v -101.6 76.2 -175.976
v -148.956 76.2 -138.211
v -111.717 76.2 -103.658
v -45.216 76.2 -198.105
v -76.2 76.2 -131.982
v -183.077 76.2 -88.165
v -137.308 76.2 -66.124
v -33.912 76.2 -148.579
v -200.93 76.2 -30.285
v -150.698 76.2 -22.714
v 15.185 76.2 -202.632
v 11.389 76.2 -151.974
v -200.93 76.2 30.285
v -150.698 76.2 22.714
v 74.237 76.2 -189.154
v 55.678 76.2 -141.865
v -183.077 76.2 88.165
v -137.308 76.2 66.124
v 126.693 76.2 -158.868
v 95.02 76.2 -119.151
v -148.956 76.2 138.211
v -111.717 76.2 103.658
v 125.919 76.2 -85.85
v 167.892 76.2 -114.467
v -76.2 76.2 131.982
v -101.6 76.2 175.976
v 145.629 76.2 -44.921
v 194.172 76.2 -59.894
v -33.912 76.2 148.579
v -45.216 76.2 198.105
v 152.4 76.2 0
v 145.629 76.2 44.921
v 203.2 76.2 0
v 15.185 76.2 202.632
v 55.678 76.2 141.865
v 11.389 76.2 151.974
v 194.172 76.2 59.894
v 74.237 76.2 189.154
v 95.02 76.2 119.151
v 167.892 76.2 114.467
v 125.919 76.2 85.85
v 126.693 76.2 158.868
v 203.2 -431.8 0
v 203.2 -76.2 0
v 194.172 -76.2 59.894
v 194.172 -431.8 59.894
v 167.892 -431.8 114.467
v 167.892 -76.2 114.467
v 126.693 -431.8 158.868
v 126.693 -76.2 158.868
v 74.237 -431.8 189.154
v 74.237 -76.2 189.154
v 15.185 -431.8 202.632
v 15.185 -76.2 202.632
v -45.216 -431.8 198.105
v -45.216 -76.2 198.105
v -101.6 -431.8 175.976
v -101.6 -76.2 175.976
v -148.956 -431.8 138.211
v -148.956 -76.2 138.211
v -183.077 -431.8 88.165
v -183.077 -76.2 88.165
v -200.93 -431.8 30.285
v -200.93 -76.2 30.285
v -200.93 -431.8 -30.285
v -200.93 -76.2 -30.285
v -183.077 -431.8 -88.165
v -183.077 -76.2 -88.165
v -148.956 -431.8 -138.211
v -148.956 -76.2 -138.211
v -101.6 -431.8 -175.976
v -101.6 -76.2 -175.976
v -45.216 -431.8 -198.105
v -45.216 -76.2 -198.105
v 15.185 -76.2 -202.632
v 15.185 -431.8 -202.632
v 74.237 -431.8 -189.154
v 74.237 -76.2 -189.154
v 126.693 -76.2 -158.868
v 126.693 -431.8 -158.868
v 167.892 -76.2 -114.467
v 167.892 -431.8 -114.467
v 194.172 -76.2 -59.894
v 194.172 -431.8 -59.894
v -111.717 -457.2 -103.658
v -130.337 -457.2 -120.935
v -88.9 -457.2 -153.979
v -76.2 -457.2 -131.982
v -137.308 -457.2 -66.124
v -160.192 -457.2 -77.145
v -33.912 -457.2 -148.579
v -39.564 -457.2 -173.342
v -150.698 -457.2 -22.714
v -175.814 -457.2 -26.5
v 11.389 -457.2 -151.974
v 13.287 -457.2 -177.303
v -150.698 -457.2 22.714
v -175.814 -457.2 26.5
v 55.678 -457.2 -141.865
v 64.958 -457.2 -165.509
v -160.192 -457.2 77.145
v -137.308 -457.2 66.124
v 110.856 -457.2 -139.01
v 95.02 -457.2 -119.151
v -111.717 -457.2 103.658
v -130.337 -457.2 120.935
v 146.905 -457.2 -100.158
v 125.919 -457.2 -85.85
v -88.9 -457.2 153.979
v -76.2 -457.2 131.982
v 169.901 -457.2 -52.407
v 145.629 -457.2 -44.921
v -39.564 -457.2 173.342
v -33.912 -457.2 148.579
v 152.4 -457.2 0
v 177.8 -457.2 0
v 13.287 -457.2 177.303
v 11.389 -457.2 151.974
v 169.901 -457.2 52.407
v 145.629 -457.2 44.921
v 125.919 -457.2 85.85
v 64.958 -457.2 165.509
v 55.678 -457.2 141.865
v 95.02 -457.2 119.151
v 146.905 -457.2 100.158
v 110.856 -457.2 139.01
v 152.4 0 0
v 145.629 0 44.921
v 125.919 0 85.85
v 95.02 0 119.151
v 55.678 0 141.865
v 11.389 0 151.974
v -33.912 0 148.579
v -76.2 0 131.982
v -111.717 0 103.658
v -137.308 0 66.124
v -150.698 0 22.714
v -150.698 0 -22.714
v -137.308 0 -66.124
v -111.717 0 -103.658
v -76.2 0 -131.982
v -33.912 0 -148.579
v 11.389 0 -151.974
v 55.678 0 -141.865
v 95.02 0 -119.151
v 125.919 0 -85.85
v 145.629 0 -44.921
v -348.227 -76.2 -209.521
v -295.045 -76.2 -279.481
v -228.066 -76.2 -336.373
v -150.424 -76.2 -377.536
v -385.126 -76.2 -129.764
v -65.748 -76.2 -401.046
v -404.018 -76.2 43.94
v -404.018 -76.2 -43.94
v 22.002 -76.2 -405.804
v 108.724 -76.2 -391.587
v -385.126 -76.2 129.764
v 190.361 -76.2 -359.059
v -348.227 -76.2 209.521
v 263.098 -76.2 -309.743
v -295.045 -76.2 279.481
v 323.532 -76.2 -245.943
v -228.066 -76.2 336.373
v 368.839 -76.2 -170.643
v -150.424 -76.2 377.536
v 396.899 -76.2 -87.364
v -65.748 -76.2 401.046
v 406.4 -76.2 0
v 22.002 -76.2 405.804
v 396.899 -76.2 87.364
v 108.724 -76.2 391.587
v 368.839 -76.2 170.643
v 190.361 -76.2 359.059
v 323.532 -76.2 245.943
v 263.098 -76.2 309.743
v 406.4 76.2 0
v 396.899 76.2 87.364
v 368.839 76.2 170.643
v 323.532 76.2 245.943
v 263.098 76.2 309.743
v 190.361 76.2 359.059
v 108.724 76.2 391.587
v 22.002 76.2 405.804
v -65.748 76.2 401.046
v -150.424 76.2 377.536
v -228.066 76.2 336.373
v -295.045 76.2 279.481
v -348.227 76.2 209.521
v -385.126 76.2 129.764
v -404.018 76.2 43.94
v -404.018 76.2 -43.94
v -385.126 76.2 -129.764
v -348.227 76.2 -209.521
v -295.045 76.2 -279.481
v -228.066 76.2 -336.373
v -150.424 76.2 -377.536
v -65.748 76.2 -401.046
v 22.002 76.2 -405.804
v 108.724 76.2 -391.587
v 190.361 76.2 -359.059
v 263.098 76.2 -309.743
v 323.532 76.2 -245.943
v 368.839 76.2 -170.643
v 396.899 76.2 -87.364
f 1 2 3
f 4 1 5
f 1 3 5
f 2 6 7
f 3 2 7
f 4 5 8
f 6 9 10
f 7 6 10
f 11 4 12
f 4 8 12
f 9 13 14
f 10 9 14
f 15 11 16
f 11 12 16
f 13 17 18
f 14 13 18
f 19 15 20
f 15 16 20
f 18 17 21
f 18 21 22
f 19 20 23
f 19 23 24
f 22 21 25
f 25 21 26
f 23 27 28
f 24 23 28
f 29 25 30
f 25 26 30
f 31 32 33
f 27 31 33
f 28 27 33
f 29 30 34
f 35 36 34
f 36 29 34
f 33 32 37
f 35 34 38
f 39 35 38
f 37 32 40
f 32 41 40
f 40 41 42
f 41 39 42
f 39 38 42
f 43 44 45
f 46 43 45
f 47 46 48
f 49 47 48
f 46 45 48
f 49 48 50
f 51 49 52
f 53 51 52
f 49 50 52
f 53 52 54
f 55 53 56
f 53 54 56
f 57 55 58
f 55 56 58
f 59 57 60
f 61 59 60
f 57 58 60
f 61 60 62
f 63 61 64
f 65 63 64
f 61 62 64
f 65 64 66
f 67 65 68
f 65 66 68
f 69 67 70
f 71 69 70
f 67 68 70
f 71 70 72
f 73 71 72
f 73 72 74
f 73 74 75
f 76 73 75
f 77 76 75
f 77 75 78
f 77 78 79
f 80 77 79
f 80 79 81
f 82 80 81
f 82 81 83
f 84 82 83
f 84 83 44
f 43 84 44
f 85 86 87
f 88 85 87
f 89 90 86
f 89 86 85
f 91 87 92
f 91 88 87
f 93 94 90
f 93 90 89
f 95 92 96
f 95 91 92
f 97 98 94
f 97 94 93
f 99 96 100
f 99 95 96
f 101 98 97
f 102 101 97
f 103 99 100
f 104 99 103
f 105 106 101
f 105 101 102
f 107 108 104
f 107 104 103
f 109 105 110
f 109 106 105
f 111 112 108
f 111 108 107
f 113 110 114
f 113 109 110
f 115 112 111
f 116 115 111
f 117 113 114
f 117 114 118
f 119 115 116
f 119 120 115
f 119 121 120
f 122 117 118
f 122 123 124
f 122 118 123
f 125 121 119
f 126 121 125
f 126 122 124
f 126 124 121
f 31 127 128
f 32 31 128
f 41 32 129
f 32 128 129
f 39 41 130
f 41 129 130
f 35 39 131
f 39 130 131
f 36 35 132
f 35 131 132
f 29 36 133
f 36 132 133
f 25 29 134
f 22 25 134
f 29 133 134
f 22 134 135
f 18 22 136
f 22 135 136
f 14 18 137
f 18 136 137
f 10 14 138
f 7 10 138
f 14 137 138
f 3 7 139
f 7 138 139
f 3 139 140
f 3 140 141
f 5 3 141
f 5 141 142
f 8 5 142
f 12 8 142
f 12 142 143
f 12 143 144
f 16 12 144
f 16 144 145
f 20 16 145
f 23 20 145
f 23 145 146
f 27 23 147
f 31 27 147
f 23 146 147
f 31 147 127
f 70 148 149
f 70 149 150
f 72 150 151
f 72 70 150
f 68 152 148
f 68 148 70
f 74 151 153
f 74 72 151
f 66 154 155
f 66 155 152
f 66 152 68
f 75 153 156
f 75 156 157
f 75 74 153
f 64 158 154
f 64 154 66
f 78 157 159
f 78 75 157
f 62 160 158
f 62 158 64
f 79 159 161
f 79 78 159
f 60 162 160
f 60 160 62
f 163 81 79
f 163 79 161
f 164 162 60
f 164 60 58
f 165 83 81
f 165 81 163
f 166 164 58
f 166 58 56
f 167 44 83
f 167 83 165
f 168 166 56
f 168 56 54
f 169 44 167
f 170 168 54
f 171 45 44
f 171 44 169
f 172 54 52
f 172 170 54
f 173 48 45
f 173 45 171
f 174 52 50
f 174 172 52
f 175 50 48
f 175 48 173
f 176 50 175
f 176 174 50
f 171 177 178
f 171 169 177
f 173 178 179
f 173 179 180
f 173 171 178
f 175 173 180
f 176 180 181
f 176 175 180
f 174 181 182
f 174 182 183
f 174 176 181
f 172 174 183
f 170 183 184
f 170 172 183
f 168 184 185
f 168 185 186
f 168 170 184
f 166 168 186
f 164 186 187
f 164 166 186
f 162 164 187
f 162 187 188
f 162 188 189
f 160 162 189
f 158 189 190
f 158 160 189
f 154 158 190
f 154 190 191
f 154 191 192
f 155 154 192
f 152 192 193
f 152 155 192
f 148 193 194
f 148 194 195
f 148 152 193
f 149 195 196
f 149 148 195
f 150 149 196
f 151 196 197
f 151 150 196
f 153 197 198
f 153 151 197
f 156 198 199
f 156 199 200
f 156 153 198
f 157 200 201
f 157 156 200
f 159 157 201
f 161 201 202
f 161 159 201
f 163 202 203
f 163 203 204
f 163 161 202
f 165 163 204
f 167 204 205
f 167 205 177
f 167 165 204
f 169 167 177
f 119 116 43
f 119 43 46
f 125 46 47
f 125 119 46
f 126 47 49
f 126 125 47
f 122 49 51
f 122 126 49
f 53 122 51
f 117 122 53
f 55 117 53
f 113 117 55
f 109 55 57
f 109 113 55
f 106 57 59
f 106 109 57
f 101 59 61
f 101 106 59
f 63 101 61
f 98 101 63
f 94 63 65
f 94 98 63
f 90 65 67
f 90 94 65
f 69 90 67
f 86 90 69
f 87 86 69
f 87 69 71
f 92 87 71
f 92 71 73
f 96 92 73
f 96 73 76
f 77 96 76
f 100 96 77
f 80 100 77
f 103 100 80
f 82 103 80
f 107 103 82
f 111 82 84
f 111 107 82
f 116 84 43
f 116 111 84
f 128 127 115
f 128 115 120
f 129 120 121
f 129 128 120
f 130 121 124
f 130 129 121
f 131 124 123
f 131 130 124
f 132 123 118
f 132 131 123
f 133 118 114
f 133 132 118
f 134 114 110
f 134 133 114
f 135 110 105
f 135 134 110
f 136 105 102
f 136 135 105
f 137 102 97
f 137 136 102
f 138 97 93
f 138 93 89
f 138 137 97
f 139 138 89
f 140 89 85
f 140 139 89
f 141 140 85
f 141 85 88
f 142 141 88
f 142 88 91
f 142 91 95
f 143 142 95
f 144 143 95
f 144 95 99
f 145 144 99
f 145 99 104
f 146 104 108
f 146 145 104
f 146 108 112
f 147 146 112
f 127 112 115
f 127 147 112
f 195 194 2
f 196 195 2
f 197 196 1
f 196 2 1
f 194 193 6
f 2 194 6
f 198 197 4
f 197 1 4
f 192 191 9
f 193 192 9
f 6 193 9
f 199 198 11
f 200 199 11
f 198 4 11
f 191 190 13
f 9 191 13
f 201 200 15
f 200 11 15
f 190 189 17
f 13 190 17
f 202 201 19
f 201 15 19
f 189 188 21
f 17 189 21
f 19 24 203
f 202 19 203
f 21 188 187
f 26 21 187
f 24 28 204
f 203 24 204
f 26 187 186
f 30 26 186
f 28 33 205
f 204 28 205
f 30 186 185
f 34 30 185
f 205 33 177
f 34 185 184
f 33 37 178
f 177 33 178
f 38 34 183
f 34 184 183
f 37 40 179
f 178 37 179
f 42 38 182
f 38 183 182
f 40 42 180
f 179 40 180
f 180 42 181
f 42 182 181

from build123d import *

# Parameters (mm, degrees)
F0_R     = 406.4
F0_R_2   = 203.2
F1_DEPTH = 76.2
F0_R_3   = 152.4
F2_DEPTH = 457.2
F3_DEPTH = 754.38
F4_SIZE  = 25.4
F5_DEPTH = 76.2


with BuildPart() as f1:
    # F0 (on Front) → F1 (new body, symmetric)
    with BuildSketch(Plane.XZ):
        Circle(F0_R)
        Circle(F0_R_2, mode=Mode.SUBTRACT)
    extrude(amount=F1_DEPTH, both=True)

    # F0 (on Front) → F2 (join)
    with BuildSketch(Plane.XZ):
        Circle(F0_R_2)
        Circle(F0_R_3, mode=Mode.SUBTRACT)
    extrude(amount=F2_DEPTH)

    # F0 (on Front) → F3 (cut)
    with BuildSketch(Plane.XZ):
        Circle(F0_R_3)
    extrude(amount=-F3_DEPTH, mode=Mode.SUBTRACT)

    # F4
    f4_edges = [f1.edges().sort_by_distance(p)[0] for p in [
        (-203.2, -457.2, 0),
    ]]
    chamfer(f4_edges, length=F4_SIZE)

    # F5 (add): a face of the model
    f5_faces = [f1.faces().sort_by_distance(p)[0] for p in [
        (-197.4526360825, 0, 0),
    ]]
    extrude(f5_faces, amount=F5_DEPTH)


solid = f1.part
